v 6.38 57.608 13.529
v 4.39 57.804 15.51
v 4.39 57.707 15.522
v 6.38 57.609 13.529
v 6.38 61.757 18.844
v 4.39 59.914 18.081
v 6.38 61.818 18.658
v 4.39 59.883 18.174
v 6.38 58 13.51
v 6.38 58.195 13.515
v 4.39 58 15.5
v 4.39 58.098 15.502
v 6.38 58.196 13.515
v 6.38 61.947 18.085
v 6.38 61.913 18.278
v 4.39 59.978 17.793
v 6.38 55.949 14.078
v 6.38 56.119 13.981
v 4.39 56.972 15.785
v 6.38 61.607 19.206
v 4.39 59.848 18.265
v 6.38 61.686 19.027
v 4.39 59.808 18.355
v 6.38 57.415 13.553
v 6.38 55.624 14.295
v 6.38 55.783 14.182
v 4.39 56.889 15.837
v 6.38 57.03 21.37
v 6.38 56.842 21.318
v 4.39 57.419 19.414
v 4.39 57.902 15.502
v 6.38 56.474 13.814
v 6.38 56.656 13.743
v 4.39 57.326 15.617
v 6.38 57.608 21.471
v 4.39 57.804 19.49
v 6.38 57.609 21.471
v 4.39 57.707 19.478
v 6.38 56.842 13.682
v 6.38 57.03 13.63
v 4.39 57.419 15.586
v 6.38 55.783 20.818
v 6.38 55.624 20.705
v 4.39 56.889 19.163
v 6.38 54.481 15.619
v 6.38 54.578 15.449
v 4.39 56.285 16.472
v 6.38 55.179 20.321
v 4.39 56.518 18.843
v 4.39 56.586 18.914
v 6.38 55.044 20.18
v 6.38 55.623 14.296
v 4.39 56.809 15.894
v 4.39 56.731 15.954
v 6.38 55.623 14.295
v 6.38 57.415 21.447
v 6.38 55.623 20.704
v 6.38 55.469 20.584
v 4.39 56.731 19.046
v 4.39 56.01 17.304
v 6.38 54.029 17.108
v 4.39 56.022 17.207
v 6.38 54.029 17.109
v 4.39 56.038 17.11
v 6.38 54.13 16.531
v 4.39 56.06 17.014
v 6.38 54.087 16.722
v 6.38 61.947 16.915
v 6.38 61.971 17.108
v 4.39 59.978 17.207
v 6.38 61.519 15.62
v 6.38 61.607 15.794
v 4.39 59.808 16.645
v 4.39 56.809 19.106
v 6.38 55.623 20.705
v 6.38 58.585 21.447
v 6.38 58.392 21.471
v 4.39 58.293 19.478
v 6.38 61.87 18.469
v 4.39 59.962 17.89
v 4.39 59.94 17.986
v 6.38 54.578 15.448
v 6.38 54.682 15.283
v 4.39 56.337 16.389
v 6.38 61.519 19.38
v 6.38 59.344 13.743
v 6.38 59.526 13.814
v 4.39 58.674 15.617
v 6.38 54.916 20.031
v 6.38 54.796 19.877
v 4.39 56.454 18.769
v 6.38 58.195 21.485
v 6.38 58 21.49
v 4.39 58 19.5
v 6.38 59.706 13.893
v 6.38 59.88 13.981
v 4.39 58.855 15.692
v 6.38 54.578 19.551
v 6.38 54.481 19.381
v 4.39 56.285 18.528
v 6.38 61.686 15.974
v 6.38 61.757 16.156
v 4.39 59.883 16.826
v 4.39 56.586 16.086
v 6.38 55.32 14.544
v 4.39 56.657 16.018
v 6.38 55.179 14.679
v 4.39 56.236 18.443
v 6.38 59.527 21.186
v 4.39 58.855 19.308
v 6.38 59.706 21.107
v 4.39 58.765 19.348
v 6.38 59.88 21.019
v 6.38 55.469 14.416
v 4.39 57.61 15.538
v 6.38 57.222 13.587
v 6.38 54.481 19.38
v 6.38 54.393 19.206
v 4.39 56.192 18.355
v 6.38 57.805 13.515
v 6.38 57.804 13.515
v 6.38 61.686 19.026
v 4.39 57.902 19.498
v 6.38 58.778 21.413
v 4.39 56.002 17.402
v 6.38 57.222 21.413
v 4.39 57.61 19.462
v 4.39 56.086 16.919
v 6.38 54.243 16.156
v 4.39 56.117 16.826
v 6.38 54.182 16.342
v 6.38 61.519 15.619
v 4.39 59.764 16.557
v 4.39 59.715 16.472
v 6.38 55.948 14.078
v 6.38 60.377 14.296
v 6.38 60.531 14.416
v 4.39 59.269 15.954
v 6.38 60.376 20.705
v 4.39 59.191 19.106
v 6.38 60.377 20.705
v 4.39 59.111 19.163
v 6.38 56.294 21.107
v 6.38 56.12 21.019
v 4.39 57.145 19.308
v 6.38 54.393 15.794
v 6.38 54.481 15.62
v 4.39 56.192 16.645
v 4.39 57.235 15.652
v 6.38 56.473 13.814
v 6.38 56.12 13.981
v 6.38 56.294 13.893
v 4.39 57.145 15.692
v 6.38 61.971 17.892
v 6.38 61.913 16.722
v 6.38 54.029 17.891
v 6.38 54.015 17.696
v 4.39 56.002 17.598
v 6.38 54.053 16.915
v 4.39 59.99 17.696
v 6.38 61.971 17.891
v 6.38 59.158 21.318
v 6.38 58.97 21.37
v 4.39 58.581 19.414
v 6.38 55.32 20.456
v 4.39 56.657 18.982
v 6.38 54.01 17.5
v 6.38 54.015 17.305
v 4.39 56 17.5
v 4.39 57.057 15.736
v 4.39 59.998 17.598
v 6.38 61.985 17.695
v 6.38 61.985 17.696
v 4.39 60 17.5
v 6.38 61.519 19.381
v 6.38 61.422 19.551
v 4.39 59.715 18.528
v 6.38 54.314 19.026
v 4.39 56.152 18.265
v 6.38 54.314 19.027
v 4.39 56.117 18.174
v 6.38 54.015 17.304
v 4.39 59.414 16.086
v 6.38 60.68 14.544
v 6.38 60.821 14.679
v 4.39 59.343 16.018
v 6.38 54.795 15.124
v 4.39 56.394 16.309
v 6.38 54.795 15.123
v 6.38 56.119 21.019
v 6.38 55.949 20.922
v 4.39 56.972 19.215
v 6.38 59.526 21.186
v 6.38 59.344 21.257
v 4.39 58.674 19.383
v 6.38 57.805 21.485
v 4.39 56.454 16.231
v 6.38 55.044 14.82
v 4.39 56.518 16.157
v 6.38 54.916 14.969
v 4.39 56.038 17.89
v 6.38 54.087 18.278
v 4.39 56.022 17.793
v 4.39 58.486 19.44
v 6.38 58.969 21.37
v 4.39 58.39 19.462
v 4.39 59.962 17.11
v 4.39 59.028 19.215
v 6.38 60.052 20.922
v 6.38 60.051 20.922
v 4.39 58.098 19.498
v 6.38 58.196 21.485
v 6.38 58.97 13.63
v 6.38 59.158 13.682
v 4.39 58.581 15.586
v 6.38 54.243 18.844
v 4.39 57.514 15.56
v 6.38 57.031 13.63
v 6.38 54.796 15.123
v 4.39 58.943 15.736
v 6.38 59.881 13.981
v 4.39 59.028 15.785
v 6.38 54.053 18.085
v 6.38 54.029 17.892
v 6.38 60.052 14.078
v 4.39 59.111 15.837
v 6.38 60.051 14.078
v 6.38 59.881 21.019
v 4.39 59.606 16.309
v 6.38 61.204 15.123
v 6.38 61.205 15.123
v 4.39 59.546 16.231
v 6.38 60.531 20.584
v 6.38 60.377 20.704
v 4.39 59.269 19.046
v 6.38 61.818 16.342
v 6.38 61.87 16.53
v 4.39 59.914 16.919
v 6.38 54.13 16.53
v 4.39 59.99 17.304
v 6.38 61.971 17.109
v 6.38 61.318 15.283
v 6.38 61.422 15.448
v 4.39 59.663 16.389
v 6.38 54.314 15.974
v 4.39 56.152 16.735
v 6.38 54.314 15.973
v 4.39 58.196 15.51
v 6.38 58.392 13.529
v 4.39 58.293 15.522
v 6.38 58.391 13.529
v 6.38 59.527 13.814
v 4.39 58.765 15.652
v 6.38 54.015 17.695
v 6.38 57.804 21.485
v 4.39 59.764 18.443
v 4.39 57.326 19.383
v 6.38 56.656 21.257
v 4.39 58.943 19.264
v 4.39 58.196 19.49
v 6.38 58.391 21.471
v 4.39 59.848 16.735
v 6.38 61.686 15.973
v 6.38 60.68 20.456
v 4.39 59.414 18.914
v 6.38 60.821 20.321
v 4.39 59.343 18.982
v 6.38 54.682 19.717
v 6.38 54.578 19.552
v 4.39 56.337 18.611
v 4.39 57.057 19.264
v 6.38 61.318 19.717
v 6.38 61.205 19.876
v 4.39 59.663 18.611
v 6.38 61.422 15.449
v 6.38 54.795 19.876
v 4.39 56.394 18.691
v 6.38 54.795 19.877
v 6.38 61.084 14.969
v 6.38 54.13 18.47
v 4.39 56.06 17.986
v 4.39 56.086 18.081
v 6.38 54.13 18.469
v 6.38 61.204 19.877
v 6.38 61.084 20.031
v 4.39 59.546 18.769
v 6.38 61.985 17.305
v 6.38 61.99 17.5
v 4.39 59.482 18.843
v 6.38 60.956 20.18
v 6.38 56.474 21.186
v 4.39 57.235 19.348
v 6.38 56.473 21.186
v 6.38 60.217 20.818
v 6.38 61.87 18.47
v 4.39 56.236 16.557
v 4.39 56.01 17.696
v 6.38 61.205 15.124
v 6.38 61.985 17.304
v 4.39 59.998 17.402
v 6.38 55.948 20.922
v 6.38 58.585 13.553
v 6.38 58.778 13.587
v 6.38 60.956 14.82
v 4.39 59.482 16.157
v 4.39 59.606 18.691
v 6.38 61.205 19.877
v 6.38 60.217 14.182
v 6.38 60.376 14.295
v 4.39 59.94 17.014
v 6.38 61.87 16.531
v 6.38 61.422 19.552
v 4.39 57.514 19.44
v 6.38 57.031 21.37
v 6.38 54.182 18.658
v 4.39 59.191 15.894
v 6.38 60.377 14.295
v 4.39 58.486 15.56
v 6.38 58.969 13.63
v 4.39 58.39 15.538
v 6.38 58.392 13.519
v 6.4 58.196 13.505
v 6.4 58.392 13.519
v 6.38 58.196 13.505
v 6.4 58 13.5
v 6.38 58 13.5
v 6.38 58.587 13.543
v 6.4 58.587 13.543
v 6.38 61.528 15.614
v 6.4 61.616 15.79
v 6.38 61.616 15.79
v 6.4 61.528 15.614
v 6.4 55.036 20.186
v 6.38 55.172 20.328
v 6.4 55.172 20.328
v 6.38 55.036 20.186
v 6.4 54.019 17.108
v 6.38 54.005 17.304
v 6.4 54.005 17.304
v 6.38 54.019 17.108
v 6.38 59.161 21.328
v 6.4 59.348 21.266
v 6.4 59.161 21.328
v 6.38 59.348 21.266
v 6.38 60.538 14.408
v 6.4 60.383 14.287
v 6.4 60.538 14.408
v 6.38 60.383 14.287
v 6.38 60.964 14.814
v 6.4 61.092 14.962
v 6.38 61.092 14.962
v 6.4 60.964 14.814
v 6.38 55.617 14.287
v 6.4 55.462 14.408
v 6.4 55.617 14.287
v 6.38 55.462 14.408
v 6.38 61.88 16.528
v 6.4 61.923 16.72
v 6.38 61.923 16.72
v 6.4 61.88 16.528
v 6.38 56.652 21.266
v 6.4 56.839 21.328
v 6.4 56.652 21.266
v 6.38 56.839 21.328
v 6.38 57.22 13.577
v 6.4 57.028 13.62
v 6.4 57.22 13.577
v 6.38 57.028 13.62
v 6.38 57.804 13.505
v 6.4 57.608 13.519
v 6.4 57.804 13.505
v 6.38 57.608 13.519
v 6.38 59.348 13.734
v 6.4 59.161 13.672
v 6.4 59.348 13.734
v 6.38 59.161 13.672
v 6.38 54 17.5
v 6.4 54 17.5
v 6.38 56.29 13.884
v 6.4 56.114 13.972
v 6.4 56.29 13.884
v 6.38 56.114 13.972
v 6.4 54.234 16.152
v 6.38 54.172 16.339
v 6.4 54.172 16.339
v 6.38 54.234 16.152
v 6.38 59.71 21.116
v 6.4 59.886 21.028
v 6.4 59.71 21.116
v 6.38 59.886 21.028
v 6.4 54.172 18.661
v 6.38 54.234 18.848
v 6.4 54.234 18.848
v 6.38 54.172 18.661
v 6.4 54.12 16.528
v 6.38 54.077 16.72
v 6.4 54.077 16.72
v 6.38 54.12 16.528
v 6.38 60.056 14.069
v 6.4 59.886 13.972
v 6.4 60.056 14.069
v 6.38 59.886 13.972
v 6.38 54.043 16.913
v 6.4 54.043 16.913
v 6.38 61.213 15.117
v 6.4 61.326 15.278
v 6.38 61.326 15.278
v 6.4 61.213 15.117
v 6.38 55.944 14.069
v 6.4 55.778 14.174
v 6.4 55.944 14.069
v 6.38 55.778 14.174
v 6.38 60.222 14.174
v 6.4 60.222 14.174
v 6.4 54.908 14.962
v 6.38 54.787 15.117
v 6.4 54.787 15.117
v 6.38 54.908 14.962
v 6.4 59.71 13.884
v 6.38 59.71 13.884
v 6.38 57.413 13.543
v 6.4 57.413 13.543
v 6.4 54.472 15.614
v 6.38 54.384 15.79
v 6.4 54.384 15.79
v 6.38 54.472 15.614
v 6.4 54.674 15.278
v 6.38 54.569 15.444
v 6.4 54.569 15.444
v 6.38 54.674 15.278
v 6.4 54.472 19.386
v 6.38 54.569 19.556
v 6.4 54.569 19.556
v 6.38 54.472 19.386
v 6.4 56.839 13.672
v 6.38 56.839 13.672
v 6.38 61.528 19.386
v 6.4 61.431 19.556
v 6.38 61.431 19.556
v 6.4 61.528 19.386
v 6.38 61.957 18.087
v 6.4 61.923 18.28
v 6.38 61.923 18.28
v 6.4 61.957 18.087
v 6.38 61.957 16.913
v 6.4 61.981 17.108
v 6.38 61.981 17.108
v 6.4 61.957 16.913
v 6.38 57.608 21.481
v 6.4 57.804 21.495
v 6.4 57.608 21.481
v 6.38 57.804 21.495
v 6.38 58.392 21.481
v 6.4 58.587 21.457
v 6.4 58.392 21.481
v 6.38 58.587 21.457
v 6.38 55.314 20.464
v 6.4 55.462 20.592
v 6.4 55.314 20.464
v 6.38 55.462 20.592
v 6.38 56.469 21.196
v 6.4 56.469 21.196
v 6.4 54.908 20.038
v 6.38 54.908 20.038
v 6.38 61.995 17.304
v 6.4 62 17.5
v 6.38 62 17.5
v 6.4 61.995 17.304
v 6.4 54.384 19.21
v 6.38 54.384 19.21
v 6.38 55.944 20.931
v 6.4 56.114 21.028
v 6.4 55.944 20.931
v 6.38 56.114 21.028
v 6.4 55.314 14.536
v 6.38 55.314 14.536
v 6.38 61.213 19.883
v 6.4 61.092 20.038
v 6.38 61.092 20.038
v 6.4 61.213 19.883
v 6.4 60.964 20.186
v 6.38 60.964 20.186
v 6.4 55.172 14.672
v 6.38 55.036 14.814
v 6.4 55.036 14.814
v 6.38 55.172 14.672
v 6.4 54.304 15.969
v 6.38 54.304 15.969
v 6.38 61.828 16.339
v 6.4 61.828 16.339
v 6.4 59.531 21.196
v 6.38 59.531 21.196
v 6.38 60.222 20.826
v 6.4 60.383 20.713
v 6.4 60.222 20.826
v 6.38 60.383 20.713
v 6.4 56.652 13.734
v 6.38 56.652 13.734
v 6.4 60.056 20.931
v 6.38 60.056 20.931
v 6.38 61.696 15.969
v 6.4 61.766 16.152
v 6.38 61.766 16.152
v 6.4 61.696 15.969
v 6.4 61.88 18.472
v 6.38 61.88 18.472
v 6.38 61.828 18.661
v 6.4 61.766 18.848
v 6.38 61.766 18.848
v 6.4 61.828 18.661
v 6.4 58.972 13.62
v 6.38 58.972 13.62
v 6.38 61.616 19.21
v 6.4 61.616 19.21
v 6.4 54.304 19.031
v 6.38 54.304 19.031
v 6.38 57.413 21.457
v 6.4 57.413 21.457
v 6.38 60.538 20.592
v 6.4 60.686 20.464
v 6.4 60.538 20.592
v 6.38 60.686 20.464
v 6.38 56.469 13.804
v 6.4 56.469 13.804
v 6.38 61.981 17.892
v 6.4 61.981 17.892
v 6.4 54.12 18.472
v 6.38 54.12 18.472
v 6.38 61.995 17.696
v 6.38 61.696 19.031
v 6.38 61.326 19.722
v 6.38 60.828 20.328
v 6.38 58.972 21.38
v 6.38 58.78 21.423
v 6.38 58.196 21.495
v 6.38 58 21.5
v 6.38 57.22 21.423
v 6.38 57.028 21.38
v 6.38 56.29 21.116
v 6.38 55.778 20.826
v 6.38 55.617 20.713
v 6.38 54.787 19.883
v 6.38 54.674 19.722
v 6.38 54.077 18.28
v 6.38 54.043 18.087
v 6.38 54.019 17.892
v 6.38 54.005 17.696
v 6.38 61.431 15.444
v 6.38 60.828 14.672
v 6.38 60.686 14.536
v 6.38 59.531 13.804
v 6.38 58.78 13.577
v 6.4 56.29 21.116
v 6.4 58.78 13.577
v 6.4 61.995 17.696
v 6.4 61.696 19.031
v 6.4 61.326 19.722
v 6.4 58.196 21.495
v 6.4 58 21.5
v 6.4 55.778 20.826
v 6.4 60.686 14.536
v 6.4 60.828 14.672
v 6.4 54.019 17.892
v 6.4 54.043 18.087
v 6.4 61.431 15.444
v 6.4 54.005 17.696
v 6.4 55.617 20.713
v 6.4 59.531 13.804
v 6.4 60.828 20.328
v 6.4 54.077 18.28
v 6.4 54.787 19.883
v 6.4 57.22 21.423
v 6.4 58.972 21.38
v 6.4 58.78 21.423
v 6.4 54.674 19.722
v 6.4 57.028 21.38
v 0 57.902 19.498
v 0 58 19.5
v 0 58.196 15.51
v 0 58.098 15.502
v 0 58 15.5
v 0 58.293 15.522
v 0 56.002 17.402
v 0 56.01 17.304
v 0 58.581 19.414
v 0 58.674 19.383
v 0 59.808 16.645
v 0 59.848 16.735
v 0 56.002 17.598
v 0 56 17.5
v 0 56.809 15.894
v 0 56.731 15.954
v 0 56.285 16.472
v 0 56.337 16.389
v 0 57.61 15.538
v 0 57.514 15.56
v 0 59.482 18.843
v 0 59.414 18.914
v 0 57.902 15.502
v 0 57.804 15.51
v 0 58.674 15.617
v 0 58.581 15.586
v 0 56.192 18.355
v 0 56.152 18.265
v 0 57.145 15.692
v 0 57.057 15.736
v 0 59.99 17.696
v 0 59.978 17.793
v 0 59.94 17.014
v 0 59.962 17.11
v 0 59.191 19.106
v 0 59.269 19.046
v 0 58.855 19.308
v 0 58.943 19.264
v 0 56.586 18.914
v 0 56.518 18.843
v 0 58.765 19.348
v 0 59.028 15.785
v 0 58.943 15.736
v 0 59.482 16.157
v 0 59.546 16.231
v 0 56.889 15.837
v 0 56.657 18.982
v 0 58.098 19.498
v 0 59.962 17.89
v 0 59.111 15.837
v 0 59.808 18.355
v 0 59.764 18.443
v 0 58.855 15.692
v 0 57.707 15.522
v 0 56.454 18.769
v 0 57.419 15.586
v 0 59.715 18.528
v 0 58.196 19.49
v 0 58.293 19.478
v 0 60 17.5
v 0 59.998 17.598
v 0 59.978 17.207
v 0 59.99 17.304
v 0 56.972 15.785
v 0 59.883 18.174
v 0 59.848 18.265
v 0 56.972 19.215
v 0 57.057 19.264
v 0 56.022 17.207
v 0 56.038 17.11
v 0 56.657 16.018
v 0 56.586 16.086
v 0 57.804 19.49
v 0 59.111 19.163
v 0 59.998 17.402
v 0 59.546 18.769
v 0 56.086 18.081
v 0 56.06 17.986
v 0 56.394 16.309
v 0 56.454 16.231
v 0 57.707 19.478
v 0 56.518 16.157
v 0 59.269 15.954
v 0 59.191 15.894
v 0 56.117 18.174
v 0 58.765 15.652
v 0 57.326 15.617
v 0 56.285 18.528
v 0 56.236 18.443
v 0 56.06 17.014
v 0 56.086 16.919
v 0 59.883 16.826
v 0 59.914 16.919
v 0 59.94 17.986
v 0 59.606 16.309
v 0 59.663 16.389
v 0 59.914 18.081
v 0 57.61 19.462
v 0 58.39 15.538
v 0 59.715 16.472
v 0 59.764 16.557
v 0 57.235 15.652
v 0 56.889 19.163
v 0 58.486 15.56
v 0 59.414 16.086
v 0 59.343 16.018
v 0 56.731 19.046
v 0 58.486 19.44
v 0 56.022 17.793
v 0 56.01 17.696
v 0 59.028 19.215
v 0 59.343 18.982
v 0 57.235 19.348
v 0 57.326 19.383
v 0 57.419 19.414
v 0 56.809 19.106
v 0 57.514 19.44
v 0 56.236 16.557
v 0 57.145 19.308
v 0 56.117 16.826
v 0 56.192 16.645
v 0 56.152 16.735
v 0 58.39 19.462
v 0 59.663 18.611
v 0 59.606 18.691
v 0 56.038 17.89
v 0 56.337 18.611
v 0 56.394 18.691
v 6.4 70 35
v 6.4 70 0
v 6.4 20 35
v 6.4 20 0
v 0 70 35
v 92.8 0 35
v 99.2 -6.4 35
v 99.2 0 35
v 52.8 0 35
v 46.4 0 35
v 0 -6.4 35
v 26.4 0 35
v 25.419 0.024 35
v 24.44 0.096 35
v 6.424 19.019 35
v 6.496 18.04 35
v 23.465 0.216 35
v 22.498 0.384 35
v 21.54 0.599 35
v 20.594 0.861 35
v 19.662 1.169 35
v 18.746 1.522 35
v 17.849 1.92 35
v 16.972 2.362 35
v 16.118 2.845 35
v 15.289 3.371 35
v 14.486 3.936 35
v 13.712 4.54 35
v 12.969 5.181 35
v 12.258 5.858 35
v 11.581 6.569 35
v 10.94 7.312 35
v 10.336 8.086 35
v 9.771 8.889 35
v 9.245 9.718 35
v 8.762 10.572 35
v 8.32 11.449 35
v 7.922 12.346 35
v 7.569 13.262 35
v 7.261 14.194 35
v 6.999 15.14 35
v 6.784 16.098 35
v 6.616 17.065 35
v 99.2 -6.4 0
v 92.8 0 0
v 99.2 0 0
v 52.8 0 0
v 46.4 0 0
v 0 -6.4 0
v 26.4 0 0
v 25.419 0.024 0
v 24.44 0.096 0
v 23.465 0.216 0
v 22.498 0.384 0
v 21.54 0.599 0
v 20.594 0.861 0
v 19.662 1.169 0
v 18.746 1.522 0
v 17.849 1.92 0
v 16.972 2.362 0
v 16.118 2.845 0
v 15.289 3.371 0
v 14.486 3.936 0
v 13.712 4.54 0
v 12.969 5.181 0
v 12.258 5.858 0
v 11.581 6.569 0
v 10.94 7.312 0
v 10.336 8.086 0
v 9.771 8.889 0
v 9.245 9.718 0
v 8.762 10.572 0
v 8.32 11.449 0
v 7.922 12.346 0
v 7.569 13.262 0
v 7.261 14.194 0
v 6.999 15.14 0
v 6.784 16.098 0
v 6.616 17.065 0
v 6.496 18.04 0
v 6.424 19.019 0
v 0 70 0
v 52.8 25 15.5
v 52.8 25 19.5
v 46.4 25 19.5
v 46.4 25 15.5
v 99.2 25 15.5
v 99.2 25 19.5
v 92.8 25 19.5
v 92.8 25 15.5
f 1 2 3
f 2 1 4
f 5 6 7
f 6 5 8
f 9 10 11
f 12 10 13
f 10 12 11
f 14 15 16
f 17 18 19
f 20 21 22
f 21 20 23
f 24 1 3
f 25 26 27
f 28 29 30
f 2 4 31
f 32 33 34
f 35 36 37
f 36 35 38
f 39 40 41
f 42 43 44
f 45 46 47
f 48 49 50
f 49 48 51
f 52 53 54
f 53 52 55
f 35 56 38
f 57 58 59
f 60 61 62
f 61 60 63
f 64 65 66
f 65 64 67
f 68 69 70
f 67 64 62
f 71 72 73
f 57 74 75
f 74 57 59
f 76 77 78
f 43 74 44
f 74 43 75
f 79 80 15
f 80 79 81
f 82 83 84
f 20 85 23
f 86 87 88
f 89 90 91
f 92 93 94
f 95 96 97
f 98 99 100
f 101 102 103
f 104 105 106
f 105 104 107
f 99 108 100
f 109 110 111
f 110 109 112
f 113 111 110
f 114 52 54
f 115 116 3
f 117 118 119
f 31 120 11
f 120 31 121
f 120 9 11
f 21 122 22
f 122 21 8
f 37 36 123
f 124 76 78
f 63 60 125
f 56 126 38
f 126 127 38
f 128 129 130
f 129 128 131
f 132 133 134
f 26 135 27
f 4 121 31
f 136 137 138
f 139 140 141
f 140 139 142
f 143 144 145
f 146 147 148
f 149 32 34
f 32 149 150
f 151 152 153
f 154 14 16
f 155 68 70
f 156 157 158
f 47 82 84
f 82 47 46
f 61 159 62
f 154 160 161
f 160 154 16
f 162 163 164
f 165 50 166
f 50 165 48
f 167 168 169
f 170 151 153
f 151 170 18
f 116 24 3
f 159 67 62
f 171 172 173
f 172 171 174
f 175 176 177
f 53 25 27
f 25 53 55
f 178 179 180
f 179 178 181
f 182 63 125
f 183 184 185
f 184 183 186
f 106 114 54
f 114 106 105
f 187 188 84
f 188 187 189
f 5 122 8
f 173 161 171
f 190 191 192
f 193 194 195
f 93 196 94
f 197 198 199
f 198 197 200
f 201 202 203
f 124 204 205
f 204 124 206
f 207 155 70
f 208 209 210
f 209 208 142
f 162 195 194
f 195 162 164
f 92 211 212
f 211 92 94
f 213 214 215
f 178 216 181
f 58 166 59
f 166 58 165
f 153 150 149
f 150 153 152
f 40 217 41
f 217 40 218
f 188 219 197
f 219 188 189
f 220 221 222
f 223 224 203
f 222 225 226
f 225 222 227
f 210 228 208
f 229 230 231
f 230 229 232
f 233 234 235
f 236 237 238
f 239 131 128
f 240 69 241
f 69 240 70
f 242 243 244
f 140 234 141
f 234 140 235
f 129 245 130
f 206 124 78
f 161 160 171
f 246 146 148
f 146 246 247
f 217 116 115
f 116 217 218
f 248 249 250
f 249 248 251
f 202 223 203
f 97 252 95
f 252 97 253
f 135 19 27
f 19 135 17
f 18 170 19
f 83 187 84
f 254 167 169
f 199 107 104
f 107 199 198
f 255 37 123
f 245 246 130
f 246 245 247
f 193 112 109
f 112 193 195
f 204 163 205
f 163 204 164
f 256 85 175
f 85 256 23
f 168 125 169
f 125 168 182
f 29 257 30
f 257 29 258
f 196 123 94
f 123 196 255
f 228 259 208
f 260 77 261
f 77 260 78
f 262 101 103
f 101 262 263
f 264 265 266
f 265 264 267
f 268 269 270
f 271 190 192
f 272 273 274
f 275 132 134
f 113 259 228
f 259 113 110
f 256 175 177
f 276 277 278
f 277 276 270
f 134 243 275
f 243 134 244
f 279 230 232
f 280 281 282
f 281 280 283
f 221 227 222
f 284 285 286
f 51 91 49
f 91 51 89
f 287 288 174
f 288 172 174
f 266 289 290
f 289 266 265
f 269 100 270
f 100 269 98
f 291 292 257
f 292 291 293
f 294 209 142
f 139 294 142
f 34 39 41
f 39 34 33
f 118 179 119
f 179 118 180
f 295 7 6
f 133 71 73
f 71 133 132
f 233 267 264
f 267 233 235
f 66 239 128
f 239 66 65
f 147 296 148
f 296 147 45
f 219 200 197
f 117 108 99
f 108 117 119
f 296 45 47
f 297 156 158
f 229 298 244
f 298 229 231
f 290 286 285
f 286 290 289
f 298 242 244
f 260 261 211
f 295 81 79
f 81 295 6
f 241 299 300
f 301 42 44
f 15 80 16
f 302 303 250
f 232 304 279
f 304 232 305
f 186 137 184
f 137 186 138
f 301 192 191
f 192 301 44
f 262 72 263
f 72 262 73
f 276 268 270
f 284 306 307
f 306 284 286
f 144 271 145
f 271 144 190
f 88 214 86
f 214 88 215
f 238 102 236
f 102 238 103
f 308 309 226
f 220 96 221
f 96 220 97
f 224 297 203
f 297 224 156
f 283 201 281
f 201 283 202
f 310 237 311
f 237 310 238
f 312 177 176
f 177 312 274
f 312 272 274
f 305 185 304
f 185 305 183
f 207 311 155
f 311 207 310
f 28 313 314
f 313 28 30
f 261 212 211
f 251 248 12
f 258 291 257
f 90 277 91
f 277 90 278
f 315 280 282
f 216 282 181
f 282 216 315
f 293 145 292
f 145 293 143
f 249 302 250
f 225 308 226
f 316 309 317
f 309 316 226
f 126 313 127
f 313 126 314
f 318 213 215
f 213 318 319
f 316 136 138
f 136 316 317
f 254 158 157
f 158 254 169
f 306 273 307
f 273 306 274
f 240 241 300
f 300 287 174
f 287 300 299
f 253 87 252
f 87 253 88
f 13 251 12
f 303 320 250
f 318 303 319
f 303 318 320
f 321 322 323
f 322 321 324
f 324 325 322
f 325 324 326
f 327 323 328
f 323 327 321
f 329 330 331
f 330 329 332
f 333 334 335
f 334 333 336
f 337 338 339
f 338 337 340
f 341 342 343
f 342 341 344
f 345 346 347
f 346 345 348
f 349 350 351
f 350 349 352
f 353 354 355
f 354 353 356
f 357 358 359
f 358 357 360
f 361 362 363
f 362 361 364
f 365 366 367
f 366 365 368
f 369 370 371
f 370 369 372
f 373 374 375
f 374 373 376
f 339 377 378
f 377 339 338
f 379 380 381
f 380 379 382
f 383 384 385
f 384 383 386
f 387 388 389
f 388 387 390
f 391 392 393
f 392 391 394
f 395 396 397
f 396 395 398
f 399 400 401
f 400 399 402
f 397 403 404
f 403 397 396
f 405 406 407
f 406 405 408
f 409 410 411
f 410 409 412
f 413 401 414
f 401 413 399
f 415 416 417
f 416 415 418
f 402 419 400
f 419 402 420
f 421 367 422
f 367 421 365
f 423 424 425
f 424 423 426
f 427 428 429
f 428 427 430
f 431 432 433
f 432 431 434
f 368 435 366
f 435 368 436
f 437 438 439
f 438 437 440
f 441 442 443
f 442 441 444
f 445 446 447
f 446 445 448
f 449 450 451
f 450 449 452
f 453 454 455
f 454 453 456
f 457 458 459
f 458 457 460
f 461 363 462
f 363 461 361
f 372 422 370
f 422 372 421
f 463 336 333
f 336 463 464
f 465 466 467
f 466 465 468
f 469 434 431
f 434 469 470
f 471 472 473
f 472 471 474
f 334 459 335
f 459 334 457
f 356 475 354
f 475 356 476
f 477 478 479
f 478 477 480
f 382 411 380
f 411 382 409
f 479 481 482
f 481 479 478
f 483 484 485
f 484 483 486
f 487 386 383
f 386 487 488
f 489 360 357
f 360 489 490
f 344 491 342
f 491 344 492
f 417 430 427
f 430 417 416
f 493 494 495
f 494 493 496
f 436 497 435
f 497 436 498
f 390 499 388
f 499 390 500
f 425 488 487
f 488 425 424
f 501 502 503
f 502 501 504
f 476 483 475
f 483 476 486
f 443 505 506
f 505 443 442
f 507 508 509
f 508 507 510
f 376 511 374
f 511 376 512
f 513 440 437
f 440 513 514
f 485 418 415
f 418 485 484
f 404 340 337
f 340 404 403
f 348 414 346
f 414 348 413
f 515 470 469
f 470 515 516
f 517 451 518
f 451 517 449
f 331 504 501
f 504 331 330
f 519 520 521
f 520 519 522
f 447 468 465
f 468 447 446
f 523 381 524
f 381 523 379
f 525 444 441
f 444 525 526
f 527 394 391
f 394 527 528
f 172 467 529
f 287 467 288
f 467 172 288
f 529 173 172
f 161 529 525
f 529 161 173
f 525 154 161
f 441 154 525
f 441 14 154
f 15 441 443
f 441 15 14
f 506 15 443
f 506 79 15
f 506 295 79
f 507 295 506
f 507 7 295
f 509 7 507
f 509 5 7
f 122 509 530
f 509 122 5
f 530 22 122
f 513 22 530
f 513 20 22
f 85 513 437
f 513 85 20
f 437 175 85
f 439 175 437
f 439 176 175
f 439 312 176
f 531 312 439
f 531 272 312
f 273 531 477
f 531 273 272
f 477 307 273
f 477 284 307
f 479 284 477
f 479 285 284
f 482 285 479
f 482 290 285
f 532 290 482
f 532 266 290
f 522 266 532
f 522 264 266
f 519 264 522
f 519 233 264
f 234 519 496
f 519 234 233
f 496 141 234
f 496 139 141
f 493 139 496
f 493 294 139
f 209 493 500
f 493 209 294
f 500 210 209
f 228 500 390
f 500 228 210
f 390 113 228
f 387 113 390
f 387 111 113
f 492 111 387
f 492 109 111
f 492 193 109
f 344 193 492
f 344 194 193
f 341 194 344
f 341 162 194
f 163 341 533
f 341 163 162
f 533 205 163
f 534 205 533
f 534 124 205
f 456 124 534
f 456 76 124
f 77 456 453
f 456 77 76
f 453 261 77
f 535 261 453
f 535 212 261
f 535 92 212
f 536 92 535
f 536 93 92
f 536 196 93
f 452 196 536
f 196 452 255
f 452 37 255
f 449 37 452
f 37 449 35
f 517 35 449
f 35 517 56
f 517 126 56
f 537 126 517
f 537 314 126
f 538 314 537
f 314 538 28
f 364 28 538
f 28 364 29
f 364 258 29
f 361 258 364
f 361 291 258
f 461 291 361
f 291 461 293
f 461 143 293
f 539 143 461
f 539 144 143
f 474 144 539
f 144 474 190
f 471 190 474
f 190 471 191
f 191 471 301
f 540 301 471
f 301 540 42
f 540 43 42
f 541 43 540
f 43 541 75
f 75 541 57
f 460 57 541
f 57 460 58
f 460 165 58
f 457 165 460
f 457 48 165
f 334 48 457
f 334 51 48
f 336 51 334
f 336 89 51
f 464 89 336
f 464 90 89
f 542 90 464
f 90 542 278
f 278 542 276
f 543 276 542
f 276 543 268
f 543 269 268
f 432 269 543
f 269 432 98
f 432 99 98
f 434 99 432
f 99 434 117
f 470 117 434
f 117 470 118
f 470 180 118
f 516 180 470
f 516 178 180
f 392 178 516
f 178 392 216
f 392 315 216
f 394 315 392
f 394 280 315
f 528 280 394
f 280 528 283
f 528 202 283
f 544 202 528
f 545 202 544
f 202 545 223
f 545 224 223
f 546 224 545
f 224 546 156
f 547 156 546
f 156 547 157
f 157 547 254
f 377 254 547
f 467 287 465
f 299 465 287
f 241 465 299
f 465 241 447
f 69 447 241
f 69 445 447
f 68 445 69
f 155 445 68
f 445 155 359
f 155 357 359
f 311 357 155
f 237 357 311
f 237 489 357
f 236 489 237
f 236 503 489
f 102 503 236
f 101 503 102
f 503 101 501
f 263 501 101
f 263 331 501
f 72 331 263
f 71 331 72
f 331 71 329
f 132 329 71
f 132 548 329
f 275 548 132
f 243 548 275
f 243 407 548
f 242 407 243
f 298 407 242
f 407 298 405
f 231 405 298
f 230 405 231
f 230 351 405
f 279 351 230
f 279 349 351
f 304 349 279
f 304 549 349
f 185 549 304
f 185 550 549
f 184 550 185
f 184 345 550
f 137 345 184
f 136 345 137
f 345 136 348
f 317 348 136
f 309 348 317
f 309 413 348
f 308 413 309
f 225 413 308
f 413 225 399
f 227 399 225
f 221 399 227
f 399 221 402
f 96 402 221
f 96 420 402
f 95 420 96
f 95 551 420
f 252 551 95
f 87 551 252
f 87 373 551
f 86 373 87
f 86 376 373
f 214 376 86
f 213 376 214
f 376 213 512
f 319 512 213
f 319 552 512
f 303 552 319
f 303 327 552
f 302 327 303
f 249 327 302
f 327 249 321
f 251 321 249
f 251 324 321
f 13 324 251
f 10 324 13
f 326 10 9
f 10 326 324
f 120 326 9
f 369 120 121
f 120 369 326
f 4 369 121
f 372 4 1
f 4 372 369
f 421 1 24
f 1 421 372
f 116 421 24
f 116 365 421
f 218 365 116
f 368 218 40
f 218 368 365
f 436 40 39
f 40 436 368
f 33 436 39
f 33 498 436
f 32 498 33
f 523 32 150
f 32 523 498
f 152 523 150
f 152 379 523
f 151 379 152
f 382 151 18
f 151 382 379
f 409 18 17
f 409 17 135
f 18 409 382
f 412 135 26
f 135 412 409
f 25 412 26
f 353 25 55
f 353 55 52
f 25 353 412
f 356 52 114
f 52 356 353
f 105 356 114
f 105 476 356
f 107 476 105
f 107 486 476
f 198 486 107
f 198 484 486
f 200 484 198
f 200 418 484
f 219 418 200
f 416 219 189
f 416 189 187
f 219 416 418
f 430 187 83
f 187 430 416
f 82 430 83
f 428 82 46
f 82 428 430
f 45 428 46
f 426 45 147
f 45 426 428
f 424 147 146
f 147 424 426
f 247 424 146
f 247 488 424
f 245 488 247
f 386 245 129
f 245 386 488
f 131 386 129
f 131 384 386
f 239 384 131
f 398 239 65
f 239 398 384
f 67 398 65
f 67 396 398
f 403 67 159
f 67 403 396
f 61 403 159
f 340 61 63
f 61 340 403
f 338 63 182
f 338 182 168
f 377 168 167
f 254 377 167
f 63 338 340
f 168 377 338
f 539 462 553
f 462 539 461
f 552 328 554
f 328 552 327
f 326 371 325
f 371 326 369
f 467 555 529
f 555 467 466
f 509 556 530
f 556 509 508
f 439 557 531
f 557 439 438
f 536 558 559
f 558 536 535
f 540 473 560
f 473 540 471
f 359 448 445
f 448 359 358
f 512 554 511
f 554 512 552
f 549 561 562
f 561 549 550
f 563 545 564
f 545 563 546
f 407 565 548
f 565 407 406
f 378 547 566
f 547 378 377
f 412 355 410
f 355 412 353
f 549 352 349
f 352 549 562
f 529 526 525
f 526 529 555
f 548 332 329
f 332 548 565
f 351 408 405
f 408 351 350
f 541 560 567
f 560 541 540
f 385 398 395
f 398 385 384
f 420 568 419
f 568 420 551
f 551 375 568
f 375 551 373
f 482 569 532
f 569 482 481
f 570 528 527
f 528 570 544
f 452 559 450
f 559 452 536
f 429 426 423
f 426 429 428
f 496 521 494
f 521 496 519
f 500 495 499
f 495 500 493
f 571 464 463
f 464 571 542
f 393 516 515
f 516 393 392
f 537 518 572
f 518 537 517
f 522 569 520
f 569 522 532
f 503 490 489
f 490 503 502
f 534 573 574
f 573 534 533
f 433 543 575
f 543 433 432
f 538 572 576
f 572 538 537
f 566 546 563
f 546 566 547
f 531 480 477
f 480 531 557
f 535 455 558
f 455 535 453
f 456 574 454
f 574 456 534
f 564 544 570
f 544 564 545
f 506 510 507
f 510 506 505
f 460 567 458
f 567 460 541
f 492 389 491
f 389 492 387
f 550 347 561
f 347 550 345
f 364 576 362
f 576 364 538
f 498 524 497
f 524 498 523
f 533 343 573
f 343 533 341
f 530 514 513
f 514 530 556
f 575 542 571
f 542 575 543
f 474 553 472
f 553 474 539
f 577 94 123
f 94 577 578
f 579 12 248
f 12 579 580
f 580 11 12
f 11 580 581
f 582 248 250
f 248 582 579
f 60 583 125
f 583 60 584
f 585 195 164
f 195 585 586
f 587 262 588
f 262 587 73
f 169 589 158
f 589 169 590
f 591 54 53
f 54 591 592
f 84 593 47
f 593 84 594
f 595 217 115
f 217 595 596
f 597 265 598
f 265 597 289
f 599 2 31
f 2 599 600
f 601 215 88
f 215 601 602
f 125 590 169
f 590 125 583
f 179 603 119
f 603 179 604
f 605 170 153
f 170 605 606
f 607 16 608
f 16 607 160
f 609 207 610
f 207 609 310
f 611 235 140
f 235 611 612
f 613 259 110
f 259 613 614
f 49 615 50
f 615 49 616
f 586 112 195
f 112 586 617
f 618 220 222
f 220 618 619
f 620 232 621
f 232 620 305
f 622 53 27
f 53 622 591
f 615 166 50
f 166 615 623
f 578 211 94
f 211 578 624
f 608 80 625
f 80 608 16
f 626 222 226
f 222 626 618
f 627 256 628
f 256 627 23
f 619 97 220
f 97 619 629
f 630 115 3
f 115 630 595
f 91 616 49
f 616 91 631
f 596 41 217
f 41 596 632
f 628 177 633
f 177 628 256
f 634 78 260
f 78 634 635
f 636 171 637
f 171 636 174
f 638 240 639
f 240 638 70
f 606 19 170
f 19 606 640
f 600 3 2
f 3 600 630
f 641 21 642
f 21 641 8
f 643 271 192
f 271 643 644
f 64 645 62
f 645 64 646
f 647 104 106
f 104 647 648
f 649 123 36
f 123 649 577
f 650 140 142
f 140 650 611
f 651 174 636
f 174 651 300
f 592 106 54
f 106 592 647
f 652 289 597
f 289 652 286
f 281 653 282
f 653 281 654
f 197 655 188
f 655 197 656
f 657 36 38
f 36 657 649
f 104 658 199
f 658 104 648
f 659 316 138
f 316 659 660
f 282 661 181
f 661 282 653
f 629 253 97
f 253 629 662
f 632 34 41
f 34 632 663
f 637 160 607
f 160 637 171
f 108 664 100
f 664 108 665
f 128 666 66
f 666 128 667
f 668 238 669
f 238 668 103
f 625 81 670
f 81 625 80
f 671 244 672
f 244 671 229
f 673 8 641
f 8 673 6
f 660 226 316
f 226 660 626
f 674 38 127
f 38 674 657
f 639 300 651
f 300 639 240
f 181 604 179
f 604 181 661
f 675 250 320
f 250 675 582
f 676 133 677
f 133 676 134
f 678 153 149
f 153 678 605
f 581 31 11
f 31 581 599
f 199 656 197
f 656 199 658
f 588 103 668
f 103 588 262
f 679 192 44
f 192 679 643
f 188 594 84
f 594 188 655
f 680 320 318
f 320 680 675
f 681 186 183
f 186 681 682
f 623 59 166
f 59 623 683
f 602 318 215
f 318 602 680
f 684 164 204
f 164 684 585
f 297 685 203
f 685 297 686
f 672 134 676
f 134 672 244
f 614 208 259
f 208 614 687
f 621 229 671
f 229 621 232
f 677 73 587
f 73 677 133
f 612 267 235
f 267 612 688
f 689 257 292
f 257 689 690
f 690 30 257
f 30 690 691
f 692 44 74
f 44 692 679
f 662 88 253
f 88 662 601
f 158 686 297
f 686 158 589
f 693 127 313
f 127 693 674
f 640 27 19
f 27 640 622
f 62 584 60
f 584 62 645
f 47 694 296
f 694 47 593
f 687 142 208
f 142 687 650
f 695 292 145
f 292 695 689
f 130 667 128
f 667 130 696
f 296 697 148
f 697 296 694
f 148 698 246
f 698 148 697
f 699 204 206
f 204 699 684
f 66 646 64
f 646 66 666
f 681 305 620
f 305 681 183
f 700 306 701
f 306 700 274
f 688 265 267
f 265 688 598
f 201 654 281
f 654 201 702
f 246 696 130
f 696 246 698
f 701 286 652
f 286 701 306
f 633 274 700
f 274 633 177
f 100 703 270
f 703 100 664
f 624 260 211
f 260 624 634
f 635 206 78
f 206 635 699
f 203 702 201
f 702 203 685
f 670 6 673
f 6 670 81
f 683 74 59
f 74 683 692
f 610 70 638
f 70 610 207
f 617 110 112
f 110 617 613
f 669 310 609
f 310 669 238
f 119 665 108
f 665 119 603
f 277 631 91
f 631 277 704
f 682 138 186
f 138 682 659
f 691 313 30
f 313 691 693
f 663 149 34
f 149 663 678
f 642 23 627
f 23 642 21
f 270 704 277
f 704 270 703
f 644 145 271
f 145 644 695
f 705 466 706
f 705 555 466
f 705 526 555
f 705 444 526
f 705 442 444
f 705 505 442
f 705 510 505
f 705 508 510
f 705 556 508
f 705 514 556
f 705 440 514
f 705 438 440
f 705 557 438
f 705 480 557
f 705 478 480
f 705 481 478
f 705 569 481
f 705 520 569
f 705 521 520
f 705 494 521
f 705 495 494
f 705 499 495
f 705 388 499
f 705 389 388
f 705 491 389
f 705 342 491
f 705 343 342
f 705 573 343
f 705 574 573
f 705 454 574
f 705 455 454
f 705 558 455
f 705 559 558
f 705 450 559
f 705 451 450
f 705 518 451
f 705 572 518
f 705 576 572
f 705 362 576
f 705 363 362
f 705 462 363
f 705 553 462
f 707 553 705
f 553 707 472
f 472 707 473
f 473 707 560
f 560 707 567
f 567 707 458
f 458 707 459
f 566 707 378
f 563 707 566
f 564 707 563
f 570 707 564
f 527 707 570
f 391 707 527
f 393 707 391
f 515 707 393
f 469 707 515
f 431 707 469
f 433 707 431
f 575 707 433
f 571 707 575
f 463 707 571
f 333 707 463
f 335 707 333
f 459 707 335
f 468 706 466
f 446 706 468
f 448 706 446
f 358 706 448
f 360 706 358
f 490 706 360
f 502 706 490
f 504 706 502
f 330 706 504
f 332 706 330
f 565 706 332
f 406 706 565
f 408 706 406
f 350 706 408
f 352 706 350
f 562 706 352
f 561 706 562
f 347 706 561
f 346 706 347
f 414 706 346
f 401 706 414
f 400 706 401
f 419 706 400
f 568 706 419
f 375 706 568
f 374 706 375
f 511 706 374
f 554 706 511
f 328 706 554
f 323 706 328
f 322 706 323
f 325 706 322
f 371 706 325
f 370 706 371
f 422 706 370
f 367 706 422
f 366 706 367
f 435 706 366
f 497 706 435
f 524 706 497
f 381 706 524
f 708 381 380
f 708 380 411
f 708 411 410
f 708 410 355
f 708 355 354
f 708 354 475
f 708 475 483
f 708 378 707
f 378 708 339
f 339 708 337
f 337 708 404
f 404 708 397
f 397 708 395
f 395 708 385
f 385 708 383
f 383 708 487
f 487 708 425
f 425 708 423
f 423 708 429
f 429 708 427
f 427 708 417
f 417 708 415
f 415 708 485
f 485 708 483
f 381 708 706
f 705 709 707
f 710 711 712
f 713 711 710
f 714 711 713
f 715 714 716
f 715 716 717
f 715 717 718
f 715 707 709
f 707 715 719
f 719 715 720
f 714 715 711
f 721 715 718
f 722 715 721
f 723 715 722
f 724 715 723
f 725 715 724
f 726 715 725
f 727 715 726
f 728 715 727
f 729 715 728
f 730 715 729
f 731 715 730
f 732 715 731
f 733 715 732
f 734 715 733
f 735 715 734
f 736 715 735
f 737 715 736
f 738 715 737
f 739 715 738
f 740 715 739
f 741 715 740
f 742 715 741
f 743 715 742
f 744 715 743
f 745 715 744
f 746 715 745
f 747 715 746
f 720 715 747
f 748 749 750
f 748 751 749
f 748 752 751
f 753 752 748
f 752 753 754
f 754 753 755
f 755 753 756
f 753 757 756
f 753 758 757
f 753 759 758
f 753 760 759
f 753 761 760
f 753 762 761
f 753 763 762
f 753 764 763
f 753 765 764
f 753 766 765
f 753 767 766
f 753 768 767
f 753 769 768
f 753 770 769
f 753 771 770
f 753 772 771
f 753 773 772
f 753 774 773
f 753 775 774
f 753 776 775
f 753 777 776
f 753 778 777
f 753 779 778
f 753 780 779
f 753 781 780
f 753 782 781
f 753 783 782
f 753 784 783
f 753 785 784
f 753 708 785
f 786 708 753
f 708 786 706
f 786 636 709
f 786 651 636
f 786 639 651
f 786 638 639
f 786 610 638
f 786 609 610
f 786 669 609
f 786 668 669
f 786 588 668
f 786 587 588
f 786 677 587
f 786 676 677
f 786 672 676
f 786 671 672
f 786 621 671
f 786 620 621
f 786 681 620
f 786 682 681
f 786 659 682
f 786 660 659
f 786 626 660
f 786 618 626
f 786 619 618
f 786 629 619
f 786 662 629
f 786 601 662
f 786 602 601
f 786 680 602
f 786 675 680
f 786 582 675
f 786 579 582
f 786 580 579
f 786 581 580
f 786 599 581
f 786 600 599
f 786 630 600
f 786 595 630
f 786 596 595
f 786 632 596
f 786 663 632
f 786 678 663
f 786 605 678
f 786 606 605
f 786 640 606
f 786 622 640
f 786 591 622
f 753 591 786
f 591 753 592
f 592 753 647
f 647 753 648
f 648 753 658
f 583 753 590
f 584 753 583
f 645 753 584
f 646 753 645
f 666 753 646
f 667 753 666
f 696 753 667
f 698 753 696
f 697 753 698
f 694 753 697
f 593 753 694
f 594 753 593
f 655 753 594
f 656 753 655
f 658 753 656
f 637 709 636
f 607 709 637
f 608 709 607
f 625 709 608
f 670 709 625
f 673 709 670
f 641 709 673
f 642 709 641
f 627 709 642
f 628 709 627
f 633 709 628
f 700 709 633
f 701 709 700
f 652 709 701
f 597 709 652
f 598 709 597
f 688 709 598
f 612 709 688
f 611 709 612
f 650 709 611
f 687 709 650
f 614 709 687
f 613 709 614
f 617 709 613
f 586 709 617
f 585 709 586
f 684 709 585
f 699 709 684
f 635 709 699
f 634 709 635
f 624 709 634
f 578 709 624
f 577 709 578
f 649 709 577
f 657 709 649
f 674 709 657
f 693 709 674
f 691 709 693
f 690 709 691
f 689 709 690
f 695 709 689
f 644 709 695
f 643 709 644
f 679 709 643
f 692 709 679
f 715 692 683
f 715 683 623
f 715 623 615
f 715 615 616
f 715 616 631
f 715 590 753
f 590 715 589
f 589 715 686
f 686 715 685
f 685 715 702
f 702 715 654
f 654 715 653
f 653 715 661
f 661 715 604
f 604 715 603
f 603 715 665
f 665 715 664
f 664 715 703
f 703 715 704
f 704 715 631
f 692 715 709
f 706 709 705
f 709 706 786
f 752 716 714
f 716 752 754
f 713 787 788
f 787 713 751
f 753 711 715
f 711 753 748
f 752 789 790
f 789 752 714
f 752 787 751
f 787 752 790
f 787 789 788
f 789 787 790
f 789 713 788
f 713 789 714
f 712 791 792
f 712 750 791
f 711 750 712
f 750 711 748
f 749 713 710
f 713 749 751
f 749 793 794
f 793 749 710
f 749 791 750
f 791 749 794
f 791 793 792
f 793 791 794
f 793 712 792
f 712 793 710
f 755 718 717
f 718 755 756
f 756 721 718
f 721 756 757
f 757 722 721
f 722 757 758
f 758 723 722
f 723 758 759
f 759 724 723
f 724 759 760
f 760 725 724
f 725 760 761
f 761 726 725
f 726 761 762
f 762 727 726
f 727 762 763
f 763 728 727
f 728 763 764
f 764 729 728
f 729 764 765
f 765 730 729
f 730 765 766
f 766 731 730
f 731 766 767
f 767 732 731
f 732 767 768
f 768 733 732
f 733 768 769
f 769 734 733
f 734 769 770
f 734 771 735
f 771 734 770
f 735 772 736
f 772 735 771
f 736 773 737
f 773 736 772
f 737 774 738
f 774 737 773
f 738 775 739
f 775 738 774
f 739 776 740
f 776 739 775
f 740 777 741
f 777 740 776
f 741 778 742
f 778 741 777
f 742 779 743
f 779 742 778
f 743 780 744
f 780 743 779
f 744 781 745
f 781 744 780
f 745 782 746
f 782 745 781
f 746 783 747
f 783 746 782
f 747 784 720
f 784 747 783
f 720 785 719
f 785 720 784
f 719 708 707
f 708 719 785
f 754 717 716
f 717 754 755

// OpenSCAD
// file: modules/screw-hole.scad
module screwHole(screwDiameter, screwHeadDiameter, screwHeadHeight, screwDepth = 50, screwHeadLead = 1) {
    screwRadius = screwDiameter / 2;
    screwHeadRadius = screwHeadDiameter / 2;
    $fa = 0.2;
    $fs = 0.5;
    
    translate([0, 0, -screwHeadHeight - 0.01])
        cylinder(screwHeadHeight, screwRadius, screwHeadRadius);
    translate([0, 0, -0.02])
        cylinder(screwHeadLead, screwHeadRadius, screwHeadRadius);
    translate([0, 0, -screwHeadHeight - screwDepth])
    cylinder(screwDepth, screwRadius, screwRadius);
}

module nutHole(nutDiameterS, screwDiameter, nutDepth = 50, screwDepth = 50) {
    screwRadius = screwDiameter / 2;
    nutRadiusS = nutDiameterS / 2;
    nutRadiusL = nutRadiusS / sqrt(3) * 2;
    
    $fa = 0.2;
    $fs = 0.5;
    
    translate([0, 0, -0.01])
    cylinder(screwDepth, screwRadius, screwRadius);
    
    translate([0, 0, -nutDepth])
    linear_extrude(nutDepth)
    polygon([
        [sin(0) * nutRadiusL, cos(0) * nutRadiusL],
        [sin(60) * nutRadiusL, cos(60) * nutRadiusL],
        [sin(120) * nutRadiusL, cos(120) * nutRadiusL],
        [sin(180) * nutRadiusL, cos(180) * nutRadiusL],
        [sin(240) * nutRadiusL, cos(240) * nutRadiusL],
        [sin(300) * nutRadiusL, cos(300) * nutRadiusL]
    ]);
}

//screwHole(4, 5, 2);
nutHole(6, 3);
// main file
thickness = 6.4;
width = 35;
height = 70;

hookDepth = 40;
hookLength = 25;
hookTipWidth = 4;

hoolaDiameter = 40;

// TODO
screwDiameter = 4;
screwHeadDiameter = 8;
screwHeadHeight = 2;

hookThinning = (width - hookTipWidth) / 2;

$fn = 128;

use <modules/screw-hole.scad>

module hook() {
    base();
    
    translate([thickness, 0, 0])
    curveFit();
    
    singleHook();
    
    translate([thickness + hookDepth, 0, 0])
    singleHook();
}

module base() {
    difference() {
        cube([thickness, height, width]);
        
        translate([thickness, height - 1.5 *  screwHeadDiameter, width / 2])
        rotate([0, 90, 0])
        screwHole(screwDiameter, screwHeadDiameter, screwHeadHeight);
    }
}

module singleHook() {    
    translate([0, -thickness, 0]) {
        cube([2 * thickness + hookDepth, thickness, width]);
    }
    
    translate([2 * thickness + hookDepth, 0, 0])
    rotate([0, -90, 0])
    linear_extrude(thickness)
    polygon([
        [0, 0],
        [width, 0],
        [width - hookThinning, hookLength],
        [hookThinning, hookLength]
    ]);
}

module curveFit() {
    translate([hoolaDiameter / 2, hoolaDiameter / 2, 0])
    linear_extrude(width)
    difference() {
        translate([-hoolaDiameter / 2, -hoolaDiameter / 2, 0])
        square([hoolaDiameter / 2, hoolaDiameter / 2]);
        
        circle(d=hoolaDiameter);
    }
}

hook();
